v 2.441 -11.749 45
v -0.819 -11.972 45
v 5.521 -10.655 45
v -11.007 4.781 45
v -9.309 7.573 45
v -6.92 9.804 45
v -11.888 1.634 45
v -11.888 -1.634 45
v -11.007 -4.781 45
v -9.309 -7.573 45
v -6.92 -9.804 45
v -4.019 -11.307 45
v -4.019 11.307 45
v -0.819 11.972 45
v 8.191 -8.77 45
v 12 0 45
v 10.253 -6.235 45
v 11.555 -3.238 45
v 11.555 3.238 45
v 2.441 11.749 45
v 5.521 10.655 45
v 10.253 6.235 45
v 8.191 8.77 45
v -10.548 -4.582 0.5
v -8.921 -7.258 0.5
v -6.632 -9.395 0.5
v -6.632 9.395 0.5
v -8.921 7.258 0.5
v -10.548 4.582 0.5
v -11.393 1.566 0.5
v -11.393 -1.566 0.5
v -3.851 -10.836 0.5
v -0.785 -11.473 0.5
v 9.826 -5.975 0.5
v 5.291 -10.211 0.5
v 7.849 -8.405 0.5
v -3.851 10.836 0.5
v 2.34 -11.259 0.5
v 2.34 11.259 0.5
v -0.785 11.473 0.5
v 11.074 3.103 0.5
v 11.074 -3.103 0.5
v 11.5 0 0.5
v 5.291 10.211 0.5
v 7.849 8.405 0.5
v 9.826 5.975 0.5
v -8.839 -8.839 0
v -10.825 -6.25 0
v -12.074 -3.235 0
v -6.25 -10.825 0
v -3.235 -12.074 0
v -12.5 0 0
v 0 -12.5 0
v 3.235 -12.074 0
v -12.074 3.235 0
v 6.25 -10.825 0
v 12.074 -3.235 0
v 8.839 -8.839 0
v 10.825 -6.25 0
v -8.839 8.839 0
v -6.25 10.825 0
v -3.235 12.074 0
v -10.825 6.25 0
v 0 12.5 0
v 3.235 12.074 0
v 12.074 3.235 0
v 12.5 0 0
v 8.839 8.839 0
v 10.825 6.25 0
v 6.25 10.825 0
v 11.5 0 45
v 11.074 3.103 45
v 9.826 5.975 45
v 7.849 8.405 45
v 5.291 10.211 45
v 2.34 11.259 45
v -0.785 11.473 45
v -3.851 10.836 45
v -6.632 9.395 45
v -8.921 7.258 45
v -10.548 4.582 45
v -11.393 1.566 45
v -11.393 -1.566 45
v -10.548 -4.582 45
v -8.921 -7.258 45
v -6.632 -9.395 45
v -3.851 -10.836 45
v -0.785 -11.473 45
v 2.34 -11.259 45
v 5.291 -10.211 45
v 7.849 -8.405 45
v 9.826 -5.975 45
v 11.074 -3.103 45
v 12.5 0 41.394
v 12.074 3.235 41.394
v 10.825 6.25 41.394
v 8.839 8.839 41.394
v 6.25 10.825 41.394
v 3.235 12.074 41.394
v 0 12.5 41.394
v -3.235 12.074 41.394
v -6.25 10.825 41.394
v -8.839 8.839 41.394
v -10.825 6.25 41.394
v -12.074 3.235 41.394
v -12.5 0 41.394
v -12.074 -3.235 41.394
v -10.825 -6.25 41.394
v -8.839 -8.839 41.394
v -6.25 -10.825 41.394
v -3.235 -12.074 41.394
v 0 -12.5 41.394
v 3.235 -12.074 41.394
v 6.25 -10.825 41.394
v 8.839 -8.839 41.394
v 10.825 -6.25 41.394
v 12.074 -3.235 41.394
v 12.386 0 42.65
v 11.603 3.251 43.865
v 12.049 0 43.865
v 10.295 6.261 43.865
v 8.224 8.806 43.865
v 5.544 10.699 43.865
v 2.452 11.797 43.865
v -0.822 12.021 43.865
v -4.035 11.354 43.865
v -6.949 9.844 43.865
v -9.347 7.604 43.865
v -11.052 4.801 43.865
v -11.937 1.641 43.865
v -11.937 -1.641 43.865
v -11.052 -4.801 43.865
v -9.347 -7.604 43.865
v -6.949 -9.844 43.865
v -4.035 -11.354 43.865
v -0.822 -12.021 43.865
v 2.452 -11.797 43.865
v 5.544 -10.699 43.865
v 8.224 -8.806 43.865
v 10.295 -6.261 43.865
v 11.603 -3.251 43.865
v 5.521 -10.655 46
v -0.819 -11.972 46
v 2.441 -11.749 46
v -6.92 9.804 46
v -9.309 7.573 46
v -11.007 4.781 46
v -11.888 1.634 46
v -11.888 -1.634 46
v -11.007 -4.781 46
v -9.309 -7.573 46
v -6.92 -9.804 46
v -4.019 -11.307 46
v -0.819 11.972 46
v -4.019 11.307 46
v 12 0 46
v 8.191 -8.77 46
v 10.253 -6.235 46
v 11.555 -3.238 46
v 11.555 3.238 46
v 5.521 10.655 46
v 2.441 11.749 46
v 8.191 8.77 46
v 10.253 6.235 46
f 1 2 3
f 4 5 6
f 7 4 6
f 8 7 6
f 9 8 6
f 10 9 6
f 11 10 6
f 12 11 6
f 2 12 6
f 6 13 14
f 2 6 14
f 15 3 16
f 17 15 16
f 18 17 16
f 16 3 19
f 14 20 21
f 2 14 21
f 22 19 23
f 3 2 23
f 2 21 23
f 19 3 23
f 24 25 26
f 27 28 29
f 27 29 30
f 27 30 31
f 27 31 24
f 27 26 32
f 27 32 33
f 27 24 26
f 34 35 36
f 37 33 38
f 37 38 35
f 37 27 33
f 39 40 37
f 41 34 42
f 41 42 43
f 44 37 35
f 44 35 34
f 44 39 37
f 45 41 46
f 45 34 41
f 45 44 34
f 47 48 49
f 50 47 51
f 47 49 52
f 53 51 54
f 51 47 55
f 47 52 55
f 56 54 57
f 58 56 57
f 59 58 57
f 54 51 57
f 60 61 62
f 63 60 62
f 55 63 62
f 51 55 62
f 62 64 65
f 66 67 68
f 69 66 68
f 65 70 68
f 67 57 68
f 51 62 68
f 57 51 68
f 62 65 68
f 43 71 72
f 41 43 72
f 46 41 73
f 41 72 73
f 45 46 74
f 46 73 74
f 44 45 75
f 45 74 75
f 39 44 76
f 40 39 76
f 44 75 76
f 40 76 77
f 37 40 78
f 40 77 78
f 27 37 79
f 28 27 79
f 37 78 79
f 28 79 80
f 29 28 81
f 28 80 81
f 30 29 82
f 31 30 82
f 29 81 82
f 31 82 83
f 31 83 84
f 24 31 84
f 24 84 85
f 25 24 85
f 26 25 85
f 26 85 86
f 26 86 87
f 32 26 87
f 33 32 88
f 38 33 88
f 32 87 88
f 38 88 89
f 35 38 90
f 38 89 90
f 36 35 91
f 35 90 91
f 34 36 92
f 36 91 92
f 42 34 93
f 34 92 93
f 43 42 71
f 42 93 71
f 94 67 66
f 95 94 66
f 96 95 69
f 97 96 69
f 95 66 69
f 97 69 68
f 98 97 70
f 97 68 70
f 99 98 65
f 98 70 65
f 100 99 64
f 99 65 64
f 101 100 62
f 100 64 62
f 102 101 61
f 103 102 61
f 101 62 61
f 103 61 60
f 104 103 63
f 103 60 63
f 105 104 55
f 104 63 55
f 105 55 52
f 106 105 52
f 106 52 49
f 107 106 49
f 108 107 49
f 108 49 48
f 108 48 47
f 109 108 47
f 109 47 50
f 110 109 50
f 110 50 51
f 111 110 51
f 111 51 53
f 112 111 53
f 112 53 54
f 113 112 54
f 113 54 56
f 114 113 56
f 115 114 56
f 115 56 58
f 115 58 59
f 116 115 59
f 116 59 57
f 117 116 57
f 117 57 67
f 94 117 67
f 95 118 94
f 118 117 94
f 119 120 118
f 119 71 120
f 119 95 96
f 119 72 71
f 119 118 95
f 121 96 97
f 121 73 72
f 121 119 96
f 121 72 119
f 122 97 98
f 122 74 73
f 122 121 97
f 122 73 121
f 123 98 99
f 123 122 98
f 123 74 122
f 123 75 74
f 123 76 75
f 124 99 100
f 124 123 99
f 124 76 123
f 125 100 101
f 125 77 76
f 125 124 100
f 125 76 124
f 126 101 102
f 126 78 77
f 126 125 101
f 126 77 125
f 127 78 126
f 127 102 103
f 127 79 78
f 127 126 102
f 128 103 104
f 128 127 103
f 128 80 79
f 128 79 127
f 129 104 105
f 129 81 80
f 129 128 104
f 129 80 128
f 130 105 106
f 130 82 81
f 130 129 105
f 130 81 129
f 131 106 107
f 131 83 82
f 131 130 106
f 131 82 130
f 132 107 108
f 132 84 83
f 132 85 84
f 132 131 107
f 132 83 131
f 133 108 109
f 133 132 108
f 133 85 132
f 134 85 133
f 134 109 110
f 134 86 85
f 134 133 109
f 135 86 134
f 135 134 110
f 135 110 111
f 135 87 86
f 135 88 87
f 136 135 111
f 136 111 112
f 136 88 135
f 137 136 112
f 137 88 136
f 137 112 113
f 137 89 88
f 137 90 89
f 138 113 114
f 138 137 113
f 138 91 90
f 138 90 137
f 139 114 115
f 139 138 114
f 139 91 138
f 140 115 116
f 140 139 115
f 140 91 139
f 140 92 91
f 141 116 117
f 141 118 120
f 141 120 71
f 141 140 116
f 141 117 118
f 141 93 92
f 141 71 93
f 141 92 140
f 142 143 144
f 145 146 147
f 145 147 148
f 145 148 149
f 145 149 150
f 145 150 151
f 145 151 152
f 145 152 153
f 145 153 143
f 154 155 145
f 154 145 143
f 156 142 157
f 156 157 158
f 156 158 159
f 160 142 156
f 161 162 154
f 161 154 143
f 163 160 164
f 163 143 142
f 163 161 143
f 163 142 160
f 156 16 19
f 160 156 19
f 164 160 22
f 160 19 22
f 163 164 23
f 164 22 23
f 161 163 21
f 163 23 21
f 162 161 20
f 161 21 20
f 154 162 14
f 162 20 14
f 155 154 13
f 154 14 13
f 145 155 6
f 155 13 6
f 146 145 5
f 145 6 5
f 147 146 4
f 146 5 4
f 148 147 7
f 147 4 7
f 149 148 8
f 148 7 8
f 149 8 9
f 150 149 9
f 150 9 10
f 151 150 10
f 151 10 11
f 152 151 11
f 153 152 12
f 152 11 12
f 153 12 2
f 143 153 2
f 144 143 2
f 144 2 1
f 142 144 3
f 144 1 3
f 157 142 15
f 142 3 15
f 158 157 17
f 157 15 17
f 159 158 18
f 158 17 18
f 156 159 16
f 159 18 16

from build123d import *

# Parameters (mm, degrees)
F0_R     = 12.5
F1_DEPTH = 45
F3_R     = 11.5
F3_R_2   = 6.5
F4_DEPTH = 44.5
F2_R     = 6.5
F6_DEPTH = 44.5
F7_R     = 12
F8_DEPTH = 1


# Not quite as in the source:
# - a fillet or chamfer that OpenCascade refuses, or shapes differently, is made with other operations: its cross-section is extruded or revolved along the edge and cut away or added


with BuildPart() as f1:
    # F0 (on Top) → F1 (new body)
    with BuildSketch(Plane.XY):
        Circle(F0_R)
    extrude(amount=F1_DEPTH)

    # F3 (on face) → F4 (cut)
    with BuildSketch(Plane.XY.offset(45)):
        Circle(F3_R)
        Circle(F3_R_2, mode=Mode.SUBTRACT)
    extrude(amount=-F4_DEPTH, mode=Mode.SUBTRACT)

    # F5: fillet of radius 7 on 1 edges, made by hand

    # F5_s1 → F5_t2 (revolve, cut)
    with BuildSketch(Plane.XZ):
        with BuildLine():
            ThreePointArc((12.5, 41.3944487245), (12.2453687816, 43.2652774179), (11.5, 45))
            Line((11.5, 45), (12.5, 45))
            Line((12.5, 45), (12.5, 41.3944487245))
        make_face()
    revolve(axis=Axis((0, 0, 45), (0, 0, 1)), mode=Mode.SUBTRACT)

    # F2 (on face) → F6 (cut)
    with BuildSketch(Plane.XY.offset(45)):
        Circle(F2_R)
    extrude(amount=-F6_DEPTH, mode=Mode.SUBTRACT)


with BuildPart() as f8:
    # F7 (on face) → F8 (new body)
    with BuildSketch(Plane.XY.offset(45)):
        Circle(F7_R)
    extrude(amount=F8_DEPTH)


solid = Compound([f1.part, f8.part])
